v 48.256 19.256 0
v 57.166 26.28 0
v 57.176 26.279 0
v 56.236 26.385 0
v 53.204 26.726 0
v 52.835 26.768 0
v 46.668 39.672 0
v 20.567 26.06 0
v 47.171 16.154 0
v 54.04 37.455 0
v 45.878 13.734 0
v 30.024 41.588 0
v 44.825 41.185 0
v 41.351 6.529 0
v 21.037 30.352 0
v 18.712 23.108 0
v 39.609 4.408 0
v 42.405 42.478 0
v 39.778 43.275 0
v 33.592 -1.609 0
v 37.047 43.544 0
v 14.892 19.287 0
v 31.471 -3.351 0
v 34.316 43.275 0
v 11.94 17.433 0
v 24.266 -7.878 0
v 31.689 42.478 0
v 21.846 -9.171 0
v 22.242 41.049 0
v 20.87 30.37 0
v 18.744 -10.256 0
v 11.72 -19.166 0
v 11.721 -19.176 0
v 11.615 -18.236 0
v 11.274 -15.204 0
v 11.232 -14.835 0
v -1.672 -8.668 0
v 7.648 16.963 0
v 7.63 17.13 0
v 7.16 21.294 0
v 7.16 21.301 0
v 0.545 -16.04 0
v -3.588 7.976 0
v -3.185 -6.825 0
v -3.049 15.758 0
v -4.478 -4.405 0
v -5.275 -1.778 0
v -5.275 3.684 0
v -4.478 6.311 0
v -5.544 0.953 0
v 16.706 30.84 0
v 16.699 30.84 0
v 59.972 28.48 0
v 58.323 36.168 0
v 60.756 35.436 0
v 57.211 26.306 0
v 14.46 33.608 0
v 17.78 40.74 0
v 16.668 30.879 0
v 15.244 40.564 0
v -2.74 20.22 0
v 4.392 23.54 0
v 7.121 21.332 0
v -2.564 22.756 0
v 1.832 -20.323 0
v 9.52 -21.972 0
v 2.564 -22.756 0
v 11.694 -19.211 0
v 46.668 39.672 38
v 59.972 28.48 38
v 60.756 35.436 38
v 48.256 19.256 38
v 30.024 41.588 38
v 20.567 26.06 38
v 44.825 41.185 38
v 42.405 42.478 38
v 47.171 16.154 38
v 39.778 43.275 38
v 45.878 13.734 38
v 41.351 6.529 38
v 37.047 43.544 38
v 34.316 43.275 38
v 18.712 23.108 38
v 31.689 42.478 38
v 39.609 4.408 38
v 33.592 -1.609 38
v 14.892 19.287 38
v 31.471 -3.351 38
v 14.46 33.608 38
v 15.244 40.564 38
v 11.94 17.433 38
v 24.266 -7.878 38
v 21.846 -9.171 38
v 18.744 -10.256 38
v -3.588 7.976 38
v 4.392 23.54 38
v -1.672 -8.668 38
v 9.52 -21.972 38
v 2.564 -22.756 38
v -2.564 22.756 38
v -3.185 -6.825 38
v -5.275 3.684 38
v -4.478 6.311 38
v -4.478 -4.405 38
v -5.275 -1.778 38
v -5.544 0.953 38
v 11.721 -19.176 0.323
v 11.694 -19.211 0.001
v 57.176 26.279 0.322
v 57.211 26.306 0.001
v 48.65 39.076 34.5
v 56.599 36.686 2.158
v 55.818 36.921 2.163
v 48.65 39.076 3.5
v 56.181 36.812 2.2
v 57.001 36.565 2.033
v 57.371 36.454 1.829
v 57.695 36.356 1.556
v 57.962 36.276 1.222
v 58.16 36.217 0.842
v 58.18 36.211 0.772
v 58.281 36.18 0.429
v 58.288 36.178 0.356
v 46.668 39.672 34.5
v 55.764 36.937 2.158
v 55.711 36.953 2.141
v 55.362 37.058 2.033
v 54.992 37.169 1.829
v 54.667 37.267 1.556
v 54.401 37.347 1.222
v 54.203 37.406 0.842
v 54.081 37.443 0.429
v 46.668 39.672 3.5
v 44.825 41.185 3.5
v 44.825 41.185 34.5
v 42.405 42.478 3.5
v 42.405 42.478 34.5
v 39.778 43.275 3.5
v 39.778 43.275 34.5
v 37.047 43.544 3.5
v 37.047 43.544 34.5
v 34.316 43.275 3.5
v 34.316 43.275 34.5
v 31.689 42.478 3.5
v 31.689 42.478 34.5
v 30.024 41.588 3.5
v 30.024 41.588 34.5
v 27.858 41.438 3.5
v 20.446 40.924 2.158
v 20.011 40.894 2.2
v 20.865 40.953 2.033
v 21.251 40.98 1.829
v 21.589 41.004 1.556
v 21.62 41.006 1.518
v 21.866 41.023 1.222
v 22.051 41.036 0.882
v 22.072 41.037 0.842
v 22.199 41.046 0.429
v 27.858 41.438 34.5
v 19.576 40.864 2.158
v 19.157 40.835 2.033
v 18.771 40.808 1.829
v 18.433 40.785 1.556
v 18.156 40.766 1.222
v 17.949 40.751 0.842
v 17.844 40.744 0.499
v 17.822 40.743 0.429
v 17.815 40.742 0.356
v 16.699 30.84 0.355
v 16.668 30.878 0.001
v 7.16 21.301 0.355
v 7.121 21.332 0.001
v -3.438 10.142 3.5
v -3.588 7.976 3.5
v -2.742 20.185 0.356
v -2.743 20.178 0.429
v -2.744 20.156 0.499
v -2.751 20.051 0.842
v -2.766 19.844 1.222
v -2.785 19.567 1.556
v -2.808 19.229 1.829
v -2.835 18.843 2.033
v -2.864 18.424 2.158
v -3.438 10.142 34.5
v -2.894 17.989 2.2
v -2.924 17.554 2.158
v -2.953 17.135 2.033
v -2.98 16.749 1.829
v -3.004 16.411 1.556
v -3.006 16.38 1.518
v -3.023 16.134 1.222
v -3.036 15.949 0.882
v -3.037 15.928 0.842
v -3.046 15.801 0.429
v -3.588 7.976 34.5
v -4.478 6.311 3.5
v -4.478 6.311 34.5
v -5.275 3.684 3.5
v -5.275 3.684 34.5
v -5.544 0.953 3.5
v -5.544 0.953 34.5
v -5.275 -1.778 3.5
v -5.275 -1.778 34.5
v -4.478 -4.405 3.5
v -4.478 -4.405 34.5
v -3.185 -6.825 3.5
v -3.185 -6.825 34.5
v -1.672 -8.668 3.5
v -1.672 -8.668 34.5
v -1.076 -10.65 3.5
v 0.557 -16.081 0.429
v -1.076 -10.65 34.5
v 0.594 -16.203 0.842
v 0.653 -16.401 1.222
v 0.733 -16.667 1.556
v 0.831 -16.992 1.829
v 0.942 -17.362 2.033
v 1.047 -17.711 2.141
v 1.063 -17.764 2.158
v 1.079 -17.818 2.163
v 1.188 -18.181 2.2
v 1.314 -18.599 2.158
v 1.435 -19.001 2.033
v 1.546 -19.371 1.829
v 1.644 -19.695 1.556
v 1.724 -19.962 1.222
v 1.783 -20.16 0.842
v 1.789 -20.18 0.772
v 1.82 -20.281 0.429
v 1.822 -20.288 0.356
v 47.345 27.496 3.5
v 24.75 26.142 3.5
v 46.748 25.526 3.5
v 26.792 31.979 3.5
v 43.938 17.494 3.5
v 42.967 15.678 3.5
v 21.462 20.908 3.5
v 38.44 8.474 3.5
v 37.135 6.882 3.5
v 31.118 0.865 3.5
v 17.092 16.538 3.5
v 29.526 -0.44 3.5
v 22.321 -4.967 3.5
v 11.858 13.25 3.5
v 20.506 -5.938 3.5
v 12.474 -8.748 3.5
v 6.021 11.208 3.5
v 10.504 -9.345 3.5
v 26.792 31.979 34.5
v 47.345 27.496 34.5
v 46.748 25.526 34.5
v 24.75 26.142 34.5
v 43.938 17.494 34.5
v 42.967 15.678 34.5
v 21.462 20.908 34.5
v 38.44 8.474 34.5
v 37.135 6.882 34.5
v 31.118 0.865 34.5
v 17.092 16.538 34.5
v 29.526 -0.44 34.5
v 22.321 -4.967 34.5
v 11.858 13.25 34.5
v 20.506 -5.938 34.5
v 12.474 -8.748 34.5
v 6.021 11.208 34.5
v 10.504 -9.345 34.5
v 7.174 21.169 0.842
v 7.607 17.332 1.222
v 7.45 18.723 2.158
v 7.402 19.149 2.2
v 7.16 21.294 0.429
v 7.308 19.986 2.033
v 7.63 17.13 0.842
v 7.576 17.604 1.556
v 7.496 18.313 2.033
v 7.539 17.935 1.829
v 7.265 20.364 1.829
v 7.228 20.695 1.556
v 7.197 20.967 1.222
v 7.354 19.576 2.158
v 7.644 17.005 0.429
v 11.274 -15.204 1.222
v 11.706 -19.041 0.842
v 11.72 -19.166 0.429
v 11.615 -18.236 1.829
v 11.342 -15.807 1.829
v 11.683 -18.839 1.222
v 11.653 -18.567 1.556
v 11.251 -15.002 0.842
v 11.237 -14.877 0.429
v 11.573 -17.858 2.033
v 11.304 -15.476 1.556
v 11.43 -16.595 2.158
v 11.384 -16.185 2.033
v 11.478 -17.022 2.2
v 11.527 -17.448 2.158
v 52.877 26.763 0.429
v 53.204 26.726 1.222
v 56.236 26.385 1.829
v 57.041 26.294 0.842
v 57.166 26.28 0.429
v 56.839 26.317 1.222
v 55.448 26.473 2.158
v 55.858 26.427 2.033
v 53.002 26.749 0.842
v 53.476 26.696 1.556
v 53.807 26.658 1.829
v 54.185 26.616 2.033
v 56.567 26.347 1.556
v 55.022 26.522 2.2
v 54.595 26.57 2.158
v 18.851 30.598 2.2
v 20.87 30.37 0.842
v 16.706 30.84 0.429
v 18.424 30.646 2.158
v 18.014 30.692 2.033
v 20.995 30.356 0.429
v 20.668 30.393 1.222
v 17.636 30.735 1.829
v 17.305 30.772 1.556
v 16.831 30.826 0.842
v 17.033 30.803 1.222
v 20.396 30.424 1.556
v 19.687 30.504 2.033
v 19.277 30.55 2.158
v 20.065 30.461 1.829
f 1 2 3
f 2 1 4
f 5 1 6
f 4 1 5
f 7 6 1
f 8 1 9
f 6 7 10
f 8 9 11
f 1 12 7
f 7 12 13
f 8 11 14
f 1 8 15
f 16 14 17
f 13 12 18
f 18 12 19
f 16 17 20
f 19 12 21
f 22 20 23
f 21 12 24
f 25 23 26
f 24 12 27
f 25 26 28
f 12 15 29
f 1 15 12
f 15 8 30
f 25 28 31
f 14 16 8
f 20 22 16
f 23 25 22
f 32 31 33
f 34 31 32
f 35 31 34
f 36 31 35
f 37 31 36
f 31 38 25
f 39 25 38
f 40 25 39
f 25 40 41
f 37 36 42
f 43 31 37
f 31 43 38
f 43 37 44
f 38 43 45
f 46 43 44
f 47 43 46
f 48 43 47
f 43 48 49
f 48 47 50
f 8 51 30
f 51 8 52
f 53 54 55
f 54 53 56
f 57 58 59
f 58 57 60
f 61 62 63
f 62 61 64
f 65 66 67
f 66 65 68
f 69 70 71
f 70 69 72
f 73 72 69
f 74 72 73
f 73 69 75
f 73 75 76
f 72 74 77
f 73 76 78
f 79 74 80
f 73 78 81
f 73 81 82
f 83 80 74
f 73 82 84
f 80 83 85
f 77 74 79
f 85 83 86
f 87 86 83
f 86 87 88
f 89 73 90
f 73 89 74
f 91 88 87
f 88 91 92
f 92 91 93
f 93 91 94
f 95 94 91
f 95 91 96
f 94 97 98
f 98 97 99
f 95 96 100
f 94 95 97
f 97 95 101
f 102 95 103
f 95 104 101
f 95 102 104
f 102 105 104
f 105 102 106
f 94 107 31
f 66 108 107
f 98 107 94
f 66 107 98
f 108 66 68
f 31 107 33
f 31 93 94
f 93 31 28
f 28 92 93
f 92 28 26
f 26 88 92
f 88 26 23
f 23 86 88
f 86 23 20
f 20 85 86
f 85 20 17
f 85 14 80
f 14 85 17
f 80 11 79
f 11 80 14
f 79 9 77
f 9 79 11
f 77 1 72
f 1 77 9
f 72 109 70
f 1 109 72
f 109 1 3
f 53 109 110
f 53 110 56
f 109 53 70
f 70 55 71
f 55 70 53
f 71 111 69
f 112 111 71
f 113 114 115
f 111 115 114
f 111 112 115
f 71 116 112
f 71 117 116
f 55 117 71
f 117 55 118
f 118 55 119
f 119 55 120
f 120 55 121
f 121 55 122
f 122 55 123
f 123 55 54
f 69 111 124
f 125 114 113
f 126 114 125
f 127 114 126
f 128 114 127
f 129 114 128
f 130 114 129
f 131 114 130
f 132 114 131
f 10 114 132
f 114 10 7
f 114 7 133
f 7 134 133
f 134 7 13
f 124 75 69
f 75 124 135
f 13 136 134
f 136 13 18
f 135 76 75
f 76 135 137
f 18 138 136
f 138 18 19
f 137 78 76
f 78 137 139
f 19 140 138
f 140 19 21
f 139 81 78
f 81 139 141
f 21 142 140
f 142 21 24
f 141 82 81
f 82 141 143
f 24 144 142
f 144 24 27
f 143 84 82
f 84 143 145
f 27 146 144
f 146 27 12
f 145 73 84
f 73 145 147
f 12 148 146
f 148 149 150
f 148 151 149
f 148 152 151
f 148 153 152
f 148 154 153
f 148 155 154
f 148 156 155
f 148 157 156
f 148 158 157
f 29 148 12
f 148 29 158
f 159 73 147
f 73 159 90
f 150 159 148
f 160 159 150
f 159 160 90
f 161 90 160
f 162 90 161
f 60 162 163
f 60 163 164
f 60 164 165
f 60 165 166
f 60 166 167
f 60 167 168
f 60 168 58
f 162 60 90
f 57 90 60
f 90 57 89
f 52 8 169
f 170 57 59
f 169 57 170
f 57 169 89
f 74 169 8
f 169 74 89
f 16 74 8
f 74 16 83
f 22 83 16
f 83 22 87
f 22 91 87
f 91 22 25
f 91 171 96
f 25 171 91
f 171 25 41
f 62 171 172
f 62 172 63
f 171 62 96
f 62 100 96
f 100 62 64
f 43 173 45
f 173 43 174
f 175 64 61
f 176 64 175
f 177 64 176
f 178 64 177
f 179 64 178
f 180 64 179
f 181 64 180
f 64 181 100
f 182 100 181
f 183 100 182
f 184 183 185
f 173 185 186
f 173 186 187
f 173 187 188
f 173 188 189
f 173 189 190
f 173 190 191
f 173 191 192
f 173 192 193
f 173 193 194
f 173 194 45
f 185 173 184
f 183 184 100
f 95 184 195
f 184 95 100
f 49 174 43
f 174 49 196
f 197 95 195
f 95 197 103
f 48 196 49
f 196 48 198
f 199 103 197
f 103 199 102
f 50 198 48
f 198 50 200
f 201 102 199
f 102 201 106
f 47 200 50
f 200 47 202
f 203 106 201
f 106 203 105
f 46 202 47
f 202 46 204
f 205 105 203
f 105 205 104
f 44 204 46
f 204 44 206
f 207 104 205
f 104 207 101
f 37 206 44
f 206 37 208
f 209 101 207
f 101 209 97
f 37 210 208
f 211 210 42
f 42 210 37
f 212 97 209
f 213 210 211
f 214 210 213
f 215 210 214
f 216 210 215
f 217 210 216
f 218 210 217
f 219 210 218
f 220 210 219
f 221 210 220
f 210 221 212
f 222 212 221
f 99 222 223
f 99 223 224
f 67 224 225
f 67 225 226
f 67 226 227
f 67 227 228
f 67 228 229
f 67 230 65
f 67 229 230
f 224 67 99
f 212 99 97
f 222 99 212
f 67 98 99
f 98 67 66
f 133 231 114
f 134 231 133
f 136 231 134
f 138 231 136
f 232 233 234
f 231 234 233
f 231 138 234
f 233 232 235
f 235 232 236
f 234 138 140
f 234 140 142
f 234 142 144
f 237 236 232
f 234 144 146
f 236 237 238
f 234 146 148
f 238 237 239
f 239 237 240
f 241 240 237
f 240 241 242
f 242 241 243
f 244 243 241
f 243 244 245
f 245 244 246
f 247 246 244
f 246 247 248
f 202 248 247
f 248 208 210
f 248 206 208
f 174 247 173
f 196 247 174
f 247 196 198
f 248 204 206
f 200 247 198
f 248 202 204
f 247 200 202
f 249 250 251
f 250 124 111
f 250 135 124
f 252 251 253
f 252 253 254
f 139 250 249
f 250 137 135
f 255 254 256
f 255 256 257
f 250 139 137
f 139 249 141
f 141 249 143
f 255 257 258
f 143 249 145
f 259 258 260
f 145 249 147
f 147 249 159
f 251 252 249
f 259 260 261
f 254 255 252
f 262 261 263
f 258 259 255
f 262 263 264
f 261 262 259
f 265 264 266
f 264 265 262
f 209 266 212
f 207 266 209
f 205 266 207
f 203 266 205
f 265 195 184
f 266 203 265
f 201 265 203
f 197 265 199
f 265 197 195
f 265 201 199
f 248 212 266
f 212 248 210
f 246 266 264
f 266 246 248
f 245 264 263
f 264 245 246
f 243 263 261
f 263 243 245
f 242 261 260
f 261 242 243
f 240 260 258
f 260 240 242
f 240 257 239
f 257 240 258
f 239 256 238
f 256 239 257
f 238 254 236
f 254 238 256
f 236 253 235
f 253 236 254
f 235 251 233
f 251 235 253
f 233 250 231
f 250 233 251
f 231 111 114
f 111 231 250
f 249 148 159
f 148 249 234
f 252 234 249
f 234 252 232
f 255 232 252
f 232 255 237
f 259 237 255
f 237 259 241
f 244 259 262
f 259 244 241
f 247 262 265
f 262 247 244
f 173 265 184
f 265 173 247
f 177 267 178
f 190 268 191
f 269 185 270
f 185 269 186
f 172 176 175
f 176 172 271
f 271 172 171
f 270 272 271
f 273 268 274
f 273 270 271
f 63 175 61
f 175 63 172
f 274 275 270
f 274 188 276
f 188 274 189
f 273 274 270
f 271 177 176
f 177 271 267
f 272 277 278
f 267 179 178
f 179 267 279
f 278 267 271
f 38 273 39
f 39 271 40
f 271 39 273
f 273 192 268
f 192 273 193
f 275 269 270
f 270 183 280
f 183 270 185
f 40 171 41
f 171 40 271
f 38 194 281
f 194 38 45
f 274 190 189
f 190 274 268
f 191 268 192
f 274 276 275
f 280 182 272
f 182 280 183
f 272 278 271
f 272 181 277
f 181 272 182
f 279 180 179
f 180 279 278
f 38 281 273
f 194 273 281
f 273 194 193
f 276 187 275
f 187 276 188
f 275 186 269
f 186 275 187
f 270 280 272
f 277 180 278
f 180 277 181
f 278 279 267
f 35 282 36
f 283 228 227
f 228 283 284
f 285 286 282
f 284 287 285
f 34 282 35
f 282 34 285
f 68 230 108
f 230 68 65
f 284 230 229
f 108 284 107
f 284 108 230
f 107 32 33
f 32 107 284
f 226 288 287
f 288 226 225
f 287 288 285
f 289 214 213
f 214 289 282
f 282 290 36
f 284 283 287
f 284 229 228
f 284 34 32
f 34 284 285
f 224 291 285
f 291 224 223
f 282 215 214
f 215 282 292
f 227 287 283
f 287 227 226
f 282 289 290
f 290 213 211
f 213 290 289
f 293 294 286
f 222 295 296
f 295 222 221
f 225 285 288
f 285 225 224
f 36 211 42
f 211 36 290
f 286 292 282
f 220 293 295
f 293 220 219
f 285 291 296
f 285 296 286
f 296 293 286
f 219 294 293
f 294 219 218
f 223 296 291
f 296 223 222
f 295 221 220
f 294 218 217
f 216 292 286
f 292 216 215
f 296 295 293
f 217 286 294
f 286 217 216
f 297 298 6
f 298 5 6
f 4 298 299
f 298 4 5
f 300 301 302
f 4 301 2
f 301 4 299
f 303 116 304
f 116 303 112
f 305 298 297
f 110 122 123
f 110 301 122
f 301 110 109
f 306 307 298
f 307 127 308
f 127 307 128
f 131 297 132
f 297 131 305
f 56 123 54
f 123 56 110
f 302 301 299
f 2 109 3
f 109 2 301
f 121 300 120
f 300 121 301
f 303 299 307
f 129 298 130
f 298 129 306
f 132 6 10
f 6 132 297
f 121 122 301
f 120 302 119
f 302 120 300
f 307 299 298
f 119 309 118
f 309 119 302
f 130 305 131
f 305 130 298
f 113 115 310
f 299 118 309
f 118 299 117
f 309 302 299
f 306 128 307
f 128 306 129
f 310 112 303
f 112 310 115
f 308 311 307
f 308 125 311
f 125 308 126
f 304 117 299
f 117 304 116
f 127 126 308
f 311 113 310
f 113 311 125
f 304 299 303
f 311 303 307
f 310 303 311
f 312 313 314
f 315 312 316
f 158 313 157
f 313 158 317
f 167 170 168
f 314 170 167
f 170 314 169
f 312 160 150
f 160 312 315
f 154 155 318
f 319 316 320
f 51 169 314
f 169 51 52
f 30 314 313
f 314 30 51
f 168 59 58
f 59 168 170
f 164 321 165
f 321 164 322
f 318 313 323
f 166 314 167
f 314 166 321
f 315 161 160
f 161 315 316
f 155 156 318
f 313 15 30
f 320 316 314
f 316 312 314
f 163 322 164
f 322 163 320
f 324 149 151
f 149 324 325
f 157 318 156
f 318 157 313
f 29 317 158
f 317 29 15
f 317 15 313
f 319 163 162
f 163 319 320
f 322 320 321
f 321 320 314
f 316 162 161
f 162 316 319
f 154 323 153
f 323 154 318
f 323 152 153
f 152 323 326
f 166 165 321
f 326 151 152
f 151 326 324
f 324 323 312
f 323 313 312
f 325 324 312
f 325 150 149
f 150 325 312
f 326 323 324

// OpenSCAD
$fn = 32;

// ----------------------------------------------------------------------
// Air duct: 28 mm duct, 3.5 mm wall, 38 mm across
// ----------------------------------------------------------------------

// --- parameters (mm) ---
duct_r = 14;              // duct core radius
duct_d = 28;              // duct core diameter
wall = 3.5;               // duct wall thickness
height = 38;              // duct width (extrusion height)
port_r = 22.9;            // port flange half width
port_d = 45.8;            // port flange width
port_t = 7;               // port flange thickness
bolt_d = 4.4;             // port bolt holes
bolt_offset = 18.2;       // bolt hole offset from the port axis

difference() {
  /* outer hull chain: tube with a flat flange plate at every port */
  linear_extrude(height = 38) {
    hull() {
      polygon([[2.564, -22.756], [-2.564, 22.756], [4.392, 23.54], [9.52, -21.972]]);
      translate([9.937, 1.12]) circle(r = 14);
    }
    hull() {
      translate([9.937, 1.12]) circle(r = 14);
      translate([8.456, 0.953]) circle(r = 14);
    }
    hull() {
      translate([8.456, 0.953]) circle(r = 14);
      translate([16.488, 3.763]) circle(r = 14);
    }
    hull() {
      translate([16.488, 3.763]) circle(r = 14);
      translate([23.693, 8.29]) circle(r = 14);
    }
    hull() {
      translate([23.693, 8.29]) circle(r = 14);
      translate([29.71, 14.307]) circle(r = 14);
    }
    hull() {
      translate([29.71, 14.307]) circle(r = 14);
      translate([34.237, 21.512]) circle(r = 14);
    }
    hull() {
      translate([34.237, 21.512]) circle(r = 14);
      translate([37.047, 29.544]) circle(r = 14);
    }
    hull() {
      translate([37.047, 29.544]) circle(r = 14);
      translate([36.88, 28.063]) circle(r = 14);
    }
    hull() {
      translate([36.88, 28.063]) circle(r = 14);
      polygon([[15.244, 40.564], [60.756, 35.436], [59.972, 28.48], [14.46, 33.608]]);
    }
  }
  /* air passage: the same chain inset by the wall, 5 mm proud of the ports */
  translate([0, 0, 3.5]) linear_extrude(height = 31) {
    hull() {
      translate([-4.969, -0.56]) circle(r = 10.5);
      translate([8.456, 0.953]) circle(r = 10.5);
    }
    hull() {
      translate([8.456, 0.953]) circle(r = 10.5);
      translate([16.488, 3.763]) circle(r = 10.5);
    }
    hull() {
      translate([16.488, 3.763]) circle(r = 10.5);
      translate([23.693, 8.29]) circle(r = 10.5);
    }
    hull() {
      translate([23.693, 8.29]) circle(r = 10.5);
      translate([29.71, 14.307]) circle(r = 10.5);
    }
    hull() {
      translate([29.71, 14.307]) circle(r = 10.5);
      translate([34.237, 21.512]) circle(r = 10.5);
    }
    hull() {
      translate([34.237, 21.512]) circle(r = 10.5);
      translate([37.047, 29.544]) circle(r = 10.5);
    }
    hull() {
      translate([37.047, 29.544]) circle(r = 10.5);
      translate([38.56, 42.969]) circle(r = 10.5);
    }
  }
  translate([0, 0]) rotate([0, 0, -83.57]) translate([-18.2, -2.5]) rotate([-90, 0, 0]) cylinder(h = 12, d = 4.4);
  translate([0, 0]) rotate([0, 0, -83.57]) translate([18.2, -2.5]) rotate([-90, 0, 0]) cylinder(h = 12, d = 4.4);
  translate([38, 38]) rotate([0, 0, 173.57]) translate([-18.2, -2.5]) rotate([-90, 0, 0]) cylinder(h = 12, d = 4.4);
  translate([38, 38]) rotate([0, 0, 173.57]) translate([18.2, -2.5]) rotate([-90, 0, 0]) cylinder(h = 12, d = 4.4);
}
